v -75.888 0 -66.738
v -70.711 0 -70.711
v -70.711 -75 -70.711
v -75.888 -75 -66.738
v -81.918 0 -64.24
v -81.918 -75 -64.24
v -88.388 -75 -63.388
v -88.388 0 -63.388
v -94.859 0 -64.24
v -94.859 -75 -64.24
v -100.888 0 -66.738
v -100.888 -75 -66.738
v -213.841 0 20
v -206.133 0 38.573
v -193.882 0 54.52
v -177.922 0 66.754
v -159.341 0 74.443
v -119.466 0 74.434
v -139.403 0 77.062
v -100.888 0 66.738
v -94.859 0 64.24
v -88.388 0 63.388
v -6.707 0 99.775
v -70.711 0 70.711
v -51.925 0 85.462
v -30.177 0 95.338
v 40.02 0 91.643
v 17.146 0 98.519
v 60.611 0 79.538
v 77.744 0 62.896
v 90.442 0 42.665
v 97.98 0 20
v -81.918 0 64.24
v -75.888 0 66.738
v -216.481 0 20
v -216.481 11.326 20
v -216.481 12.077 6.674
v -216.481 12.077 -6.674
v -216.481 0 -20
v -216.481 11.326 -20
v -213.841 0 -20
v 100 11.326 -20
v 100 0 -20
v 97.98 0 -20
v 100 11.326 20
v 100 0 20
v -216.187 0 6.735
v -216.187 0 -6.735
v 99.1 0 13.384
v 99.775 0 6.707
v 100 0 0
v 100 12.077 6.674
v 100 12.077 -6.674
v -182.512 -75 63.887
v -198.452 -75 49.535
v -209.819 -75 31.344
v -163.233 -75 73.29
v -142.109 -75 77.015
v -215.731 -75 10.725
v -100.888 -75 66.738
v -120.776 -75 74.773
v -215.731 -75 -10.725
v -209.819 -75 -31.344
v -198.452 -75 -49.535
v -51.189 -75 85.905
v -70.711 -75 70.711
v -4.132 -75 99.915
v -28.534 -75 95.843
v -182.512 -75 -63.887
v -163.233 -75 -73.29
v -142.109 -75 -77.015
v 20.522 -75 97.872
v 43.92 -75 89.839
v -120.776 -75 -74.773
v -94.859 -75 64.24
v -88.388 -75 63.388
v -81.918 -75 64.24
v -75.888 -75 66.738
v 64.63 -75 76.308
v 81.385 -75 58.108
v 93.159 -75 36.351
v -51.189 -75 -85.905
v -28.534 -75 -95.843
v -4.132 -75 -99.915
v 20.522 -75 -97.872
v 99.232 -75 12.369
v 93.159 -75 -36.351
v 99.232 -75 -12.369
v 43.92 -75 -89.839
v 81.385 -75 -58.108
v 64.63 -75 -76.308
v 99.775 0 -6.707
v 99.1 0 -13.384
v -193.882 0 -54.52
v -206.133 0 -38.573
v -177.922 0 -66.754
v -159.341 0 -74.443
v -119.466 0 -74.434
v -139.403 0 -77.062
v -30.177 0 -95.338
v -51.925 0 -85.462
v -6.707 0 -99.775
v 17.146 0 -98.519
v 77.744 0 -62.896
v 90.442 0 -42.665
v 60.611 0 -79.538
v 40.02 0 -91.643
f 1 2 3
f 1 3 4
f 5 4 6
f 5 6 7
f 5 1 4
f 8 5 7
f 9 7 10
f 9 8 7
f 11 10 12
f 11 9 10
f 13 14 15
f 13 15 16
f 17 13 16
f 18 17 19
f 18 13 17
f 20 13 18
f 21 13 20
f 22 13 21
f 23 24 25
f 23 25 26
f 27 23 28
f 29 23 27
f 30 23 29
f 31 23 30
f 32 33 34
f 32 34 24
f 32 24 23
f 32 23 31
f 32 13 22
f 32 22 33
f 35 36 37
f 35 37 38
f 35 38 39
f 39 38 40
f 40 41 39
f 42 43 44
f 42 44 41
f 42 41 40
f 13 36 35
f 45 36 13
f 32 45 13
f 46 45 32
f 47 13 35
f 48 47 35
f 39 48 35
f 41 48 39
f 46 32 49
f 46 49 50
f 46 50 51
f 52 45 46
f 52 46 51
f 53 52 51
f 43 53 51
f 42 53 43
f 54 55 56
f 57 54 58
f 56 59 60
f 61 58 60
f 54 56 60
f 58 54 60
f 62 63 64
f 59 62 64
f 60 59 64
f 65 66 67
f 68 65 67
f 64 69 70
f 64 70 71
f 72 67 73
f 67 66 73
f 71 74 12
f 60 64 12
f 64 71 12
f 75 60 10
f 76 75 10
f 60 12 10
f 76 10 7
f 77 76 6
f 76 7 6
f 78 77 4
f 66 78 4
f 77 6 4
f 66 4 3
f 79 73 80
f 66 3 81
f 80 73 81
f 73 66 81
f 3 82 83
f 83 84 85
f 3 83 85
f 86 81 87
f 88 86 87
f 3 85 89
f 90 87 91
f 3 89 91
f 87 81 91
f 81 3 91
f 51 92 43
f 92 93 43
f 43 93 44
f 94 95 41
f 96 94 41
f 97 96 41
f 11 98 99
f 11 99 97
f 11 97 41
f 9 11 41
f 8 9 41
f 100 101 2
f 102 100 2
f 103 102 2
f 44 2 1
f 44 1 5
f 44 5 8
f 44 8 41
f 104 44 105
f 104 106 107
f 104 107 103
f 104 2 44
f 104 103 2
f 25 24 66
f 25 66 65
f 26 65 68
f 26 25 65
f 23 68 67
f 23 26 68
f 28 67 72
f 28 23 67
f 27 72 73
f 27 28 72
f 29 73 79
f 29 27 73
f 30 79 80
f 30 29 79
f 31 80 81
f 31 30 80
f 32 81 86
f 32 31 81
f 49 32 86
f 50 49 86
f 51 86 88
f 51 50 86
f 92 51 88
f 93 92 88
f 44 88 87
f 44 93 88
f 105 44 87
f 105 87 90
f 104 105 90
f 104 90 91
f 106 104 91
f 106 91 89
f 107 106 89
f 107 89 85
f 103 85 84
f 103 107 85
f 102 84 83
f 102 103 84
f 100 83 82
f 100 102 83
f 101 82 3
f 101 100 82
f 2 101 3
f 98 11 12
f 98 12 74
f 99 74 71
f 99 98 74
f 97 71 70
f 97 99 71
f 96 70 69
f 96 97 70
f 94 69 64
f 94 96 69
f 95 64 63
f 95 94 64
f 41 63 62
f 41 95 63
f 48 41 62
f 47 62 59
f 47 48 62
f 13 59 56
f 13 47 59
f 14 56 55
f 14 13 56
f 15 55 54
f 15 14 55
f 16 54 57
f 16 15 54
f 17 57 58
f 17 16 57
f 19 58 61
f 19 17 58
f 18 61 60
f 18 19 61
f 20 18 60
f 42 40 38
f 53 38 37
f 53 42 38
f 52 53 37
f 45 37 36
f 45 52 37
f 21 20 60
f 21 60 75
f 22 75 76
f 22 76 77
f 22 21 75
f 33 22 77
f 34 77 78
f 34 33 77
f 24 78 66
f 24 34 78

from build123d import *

# Parameters (mm, degrees)
BOSS_EXTRUDE3_DEPTH      = 75
BOSS_EXTRUDE4_DEPTH      = 100
BOSS_EXTRUDE4_DEPTH_BACK = 216.481457


with BuildPart() as part:
    # Sketch1 → Boss-Extrude3 (new body)
    with BuildSketch(Plane(origin=(0, 0, 0), x_dir=(1, 0, 0), z_dir=(0, 1, 0))):
        with BuildLine():
            ThreePointArc((-70.710678119, -70.710678119), (100, 0), (-70.710678119, 70.710678119))
            ThreePointArc((-70.710678119, 70.710678119), (-85.125192843, 63.602226114), (-100.888347648, 66.737712554))
            ThreePointArc((-100.888347648, 66.737712554), (-216.481456572, 0), (-100.888347648, -66.737712554))
            ThreePointArc((-100.888347648, -66.737712554), (-85.125192843, -63.602226114), (-70.710678119, -70.710678119))
        make_face()
    extrude(amount=-BOSS_EXTRUDE3_DEPTH)

    # Sketch6 → Boss-Extrude4 (add, two sides)
    with BuildSketch(Plane(origin=(0, 0, 0), x_dir=(0, 0, -1), z_dir=(1, 0, 0))) as boss_extrude4_sk:
        with BuildLine():
            Line((20, 0), (20, 11.326222077))
            ThreePointArc((20, 11.326222077), (0, 12.171), (-20, 11.326222077))
            Line((-20, 11.326222077), (-20, 0))
            Line((-20, 0), (20, 0))
        make_face()
    extrude(amount=BOSS_EXTRUDE4_DEPTH)
    extrude(boss_extrude4_sk.sketch, amount=-BOSS_EXTRUDE4_DEPTH_BACK)


solid = part.part
